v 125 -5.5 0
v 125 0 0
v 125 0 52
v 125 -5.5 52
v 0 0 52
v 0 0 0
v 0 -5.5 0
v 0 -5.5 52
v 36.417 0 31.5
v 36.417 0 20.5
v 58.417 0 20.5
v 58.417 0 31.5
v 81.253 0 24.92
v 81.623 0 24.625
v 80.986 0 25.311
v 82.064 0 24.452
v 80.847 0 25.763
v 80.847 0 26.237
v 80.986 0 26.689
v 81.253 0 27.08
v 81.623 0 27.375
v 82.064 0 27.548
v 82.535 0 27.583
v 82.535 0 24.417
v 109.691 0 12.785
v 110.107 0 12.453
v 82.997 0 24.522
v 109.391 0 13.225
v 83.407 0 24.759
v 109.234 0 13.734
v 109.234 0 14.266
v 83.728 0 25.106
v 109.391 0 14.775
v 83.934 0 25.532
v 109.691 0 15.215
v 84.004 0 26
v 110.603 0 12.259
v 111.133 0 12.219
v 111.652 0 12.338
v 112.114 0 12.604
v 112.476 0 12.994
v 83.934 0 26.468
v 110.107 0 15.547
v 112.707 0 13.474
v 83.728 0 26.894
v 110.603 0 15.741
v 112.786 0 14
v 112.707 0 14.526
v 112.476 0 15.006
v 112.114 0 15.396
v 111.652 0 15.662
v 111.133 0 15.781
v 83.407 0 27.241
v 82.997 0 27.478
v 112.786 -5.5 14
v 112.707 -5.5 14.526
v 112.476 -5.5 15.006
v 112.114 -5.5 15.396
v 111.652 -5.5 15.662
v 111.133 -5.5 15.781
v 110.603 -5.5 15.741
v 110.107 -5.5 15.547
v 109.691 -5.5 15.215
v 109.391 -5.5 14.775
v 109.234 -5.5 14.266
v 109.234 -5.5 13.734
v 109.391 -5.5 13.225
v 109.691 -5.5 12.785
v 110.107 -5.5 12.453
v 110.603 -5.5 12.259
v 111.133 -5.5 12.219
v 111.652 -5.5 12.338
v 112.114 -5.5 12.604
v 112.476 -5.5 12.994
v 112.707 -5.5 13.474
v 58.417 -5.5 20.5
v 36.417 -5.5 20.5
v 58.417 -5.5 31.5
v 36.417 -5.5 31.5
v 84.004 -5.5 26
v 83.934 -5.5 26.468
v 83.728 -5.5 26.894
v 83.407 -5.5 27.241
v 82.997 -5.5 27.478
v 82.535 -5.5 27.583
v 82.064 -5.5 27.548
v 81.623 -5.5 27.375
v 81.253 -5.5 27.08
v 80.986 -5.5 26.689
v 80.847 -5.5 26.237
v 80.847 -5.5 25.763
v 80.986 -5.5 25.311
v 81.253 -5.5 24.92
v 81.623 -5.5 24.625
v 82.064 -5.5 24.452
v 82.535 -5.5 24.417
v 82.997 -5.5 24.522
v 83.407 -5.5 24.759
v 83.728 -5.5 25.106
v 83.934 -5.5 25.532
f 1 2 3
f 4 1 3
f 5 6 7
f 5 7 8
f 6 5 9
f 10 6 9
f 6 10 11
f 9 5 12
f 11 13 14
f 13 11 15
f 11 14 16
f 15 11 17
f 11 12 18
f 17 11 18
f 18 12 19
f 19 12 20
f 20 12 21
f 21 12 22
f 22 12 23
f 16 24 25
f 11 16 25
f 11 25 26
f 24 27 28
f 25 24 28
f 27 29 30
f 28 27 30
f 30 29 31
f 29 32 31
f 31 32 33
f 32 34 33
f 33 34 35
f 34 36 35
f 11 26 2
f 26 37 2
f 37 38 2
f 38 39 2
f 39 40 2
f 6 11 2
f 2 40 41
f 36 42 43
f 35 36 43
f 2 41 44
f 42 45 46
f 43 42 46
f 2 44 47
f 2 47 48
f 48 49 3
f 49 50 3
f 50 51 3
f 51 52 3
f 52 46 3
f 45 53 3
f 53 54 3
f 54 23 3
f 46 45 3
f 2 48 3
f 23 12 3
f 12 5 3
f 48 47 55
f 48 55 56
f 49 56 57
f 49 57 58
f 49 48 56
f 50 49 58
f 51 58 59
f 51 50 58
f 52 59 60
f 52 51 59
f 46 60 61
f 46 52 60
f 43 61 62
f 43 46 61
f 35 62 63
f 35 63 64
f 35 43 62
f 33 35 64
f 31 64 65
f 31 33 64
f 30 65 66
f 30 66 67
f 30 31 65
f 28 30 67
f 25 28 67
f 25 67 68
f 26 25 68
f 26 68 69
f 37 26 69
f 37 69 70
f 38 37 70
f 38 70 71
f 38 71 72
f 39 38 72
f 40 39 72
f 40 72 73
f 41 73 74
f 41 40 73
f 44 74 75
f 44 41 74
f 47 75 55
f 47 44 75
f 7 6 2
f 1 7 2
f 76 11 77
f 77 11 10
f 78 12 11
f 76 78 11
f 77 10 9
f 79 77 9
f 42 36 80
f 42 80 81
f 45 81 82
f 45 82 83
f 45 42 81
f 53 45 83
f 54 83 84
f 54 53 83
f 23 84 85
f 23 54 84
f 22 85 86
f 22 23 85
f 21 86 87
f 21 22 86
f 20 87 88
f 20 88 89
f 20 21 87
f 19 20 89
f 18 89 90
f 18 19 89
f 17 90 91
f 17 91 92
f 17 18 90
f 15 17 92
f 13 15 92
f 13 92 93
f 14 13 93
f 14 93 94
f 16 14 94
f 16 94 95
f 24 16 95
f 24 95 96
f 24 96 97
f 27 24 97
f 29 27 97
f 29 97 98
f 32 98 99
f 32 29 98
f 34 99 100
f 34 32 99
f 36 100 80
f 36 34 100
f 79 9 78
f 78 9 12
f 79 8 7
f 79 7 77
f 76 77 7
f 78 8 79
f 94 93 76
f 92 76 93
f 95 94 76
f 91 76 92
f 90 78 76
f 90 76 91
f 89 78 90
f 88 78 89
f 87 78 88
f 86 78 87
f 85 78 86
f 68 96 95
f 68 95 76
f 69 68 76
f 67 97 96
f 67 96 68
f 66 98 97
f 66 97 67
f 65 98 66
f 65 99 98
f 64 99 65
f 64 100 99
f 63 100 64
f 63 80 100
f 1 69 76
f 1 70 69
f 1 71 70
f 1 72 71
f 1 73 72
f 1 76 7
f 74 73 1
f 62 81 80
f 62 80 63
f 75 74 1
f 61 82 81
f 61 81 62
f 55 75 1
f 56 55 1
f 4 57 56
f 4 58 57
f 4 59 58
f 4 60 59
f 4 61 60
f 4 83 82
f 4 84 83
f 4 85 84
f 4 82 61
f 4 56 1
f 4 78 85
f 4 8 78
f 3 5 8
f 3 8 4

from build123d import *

# Parameters (mm, degrees)
F0_W     = 125
F0_H     = 52
F0_R     = 1.785938
F0_R_2   = 1.5875
F1_DEPTH = 5.5


with BuildPart() as f1:
    # F0 (on Front) → F1 (new body)
    with BuildSketch(Plane.XZ):
        with Locations((62.5, 26)):
            Rectangle(F0_W, F0_H)
        with Locations((111, 14)):
            Circle(F0_R, mode=Mode.SUBTRACT)
        Polygon((58.416788, 31.5), (58.416788, 26), (58.416788, 20.5), (36.416788, 20.5), (36.416788, 31.5), align=None, mode=Mode.SUBTRACT)
        with Locations((82.416788, 26)):
            Circle(F0_R_2, mode=Mode.SUBTRACT)
    extrude(amount=F1_DEPTH)


solid = f1.part
